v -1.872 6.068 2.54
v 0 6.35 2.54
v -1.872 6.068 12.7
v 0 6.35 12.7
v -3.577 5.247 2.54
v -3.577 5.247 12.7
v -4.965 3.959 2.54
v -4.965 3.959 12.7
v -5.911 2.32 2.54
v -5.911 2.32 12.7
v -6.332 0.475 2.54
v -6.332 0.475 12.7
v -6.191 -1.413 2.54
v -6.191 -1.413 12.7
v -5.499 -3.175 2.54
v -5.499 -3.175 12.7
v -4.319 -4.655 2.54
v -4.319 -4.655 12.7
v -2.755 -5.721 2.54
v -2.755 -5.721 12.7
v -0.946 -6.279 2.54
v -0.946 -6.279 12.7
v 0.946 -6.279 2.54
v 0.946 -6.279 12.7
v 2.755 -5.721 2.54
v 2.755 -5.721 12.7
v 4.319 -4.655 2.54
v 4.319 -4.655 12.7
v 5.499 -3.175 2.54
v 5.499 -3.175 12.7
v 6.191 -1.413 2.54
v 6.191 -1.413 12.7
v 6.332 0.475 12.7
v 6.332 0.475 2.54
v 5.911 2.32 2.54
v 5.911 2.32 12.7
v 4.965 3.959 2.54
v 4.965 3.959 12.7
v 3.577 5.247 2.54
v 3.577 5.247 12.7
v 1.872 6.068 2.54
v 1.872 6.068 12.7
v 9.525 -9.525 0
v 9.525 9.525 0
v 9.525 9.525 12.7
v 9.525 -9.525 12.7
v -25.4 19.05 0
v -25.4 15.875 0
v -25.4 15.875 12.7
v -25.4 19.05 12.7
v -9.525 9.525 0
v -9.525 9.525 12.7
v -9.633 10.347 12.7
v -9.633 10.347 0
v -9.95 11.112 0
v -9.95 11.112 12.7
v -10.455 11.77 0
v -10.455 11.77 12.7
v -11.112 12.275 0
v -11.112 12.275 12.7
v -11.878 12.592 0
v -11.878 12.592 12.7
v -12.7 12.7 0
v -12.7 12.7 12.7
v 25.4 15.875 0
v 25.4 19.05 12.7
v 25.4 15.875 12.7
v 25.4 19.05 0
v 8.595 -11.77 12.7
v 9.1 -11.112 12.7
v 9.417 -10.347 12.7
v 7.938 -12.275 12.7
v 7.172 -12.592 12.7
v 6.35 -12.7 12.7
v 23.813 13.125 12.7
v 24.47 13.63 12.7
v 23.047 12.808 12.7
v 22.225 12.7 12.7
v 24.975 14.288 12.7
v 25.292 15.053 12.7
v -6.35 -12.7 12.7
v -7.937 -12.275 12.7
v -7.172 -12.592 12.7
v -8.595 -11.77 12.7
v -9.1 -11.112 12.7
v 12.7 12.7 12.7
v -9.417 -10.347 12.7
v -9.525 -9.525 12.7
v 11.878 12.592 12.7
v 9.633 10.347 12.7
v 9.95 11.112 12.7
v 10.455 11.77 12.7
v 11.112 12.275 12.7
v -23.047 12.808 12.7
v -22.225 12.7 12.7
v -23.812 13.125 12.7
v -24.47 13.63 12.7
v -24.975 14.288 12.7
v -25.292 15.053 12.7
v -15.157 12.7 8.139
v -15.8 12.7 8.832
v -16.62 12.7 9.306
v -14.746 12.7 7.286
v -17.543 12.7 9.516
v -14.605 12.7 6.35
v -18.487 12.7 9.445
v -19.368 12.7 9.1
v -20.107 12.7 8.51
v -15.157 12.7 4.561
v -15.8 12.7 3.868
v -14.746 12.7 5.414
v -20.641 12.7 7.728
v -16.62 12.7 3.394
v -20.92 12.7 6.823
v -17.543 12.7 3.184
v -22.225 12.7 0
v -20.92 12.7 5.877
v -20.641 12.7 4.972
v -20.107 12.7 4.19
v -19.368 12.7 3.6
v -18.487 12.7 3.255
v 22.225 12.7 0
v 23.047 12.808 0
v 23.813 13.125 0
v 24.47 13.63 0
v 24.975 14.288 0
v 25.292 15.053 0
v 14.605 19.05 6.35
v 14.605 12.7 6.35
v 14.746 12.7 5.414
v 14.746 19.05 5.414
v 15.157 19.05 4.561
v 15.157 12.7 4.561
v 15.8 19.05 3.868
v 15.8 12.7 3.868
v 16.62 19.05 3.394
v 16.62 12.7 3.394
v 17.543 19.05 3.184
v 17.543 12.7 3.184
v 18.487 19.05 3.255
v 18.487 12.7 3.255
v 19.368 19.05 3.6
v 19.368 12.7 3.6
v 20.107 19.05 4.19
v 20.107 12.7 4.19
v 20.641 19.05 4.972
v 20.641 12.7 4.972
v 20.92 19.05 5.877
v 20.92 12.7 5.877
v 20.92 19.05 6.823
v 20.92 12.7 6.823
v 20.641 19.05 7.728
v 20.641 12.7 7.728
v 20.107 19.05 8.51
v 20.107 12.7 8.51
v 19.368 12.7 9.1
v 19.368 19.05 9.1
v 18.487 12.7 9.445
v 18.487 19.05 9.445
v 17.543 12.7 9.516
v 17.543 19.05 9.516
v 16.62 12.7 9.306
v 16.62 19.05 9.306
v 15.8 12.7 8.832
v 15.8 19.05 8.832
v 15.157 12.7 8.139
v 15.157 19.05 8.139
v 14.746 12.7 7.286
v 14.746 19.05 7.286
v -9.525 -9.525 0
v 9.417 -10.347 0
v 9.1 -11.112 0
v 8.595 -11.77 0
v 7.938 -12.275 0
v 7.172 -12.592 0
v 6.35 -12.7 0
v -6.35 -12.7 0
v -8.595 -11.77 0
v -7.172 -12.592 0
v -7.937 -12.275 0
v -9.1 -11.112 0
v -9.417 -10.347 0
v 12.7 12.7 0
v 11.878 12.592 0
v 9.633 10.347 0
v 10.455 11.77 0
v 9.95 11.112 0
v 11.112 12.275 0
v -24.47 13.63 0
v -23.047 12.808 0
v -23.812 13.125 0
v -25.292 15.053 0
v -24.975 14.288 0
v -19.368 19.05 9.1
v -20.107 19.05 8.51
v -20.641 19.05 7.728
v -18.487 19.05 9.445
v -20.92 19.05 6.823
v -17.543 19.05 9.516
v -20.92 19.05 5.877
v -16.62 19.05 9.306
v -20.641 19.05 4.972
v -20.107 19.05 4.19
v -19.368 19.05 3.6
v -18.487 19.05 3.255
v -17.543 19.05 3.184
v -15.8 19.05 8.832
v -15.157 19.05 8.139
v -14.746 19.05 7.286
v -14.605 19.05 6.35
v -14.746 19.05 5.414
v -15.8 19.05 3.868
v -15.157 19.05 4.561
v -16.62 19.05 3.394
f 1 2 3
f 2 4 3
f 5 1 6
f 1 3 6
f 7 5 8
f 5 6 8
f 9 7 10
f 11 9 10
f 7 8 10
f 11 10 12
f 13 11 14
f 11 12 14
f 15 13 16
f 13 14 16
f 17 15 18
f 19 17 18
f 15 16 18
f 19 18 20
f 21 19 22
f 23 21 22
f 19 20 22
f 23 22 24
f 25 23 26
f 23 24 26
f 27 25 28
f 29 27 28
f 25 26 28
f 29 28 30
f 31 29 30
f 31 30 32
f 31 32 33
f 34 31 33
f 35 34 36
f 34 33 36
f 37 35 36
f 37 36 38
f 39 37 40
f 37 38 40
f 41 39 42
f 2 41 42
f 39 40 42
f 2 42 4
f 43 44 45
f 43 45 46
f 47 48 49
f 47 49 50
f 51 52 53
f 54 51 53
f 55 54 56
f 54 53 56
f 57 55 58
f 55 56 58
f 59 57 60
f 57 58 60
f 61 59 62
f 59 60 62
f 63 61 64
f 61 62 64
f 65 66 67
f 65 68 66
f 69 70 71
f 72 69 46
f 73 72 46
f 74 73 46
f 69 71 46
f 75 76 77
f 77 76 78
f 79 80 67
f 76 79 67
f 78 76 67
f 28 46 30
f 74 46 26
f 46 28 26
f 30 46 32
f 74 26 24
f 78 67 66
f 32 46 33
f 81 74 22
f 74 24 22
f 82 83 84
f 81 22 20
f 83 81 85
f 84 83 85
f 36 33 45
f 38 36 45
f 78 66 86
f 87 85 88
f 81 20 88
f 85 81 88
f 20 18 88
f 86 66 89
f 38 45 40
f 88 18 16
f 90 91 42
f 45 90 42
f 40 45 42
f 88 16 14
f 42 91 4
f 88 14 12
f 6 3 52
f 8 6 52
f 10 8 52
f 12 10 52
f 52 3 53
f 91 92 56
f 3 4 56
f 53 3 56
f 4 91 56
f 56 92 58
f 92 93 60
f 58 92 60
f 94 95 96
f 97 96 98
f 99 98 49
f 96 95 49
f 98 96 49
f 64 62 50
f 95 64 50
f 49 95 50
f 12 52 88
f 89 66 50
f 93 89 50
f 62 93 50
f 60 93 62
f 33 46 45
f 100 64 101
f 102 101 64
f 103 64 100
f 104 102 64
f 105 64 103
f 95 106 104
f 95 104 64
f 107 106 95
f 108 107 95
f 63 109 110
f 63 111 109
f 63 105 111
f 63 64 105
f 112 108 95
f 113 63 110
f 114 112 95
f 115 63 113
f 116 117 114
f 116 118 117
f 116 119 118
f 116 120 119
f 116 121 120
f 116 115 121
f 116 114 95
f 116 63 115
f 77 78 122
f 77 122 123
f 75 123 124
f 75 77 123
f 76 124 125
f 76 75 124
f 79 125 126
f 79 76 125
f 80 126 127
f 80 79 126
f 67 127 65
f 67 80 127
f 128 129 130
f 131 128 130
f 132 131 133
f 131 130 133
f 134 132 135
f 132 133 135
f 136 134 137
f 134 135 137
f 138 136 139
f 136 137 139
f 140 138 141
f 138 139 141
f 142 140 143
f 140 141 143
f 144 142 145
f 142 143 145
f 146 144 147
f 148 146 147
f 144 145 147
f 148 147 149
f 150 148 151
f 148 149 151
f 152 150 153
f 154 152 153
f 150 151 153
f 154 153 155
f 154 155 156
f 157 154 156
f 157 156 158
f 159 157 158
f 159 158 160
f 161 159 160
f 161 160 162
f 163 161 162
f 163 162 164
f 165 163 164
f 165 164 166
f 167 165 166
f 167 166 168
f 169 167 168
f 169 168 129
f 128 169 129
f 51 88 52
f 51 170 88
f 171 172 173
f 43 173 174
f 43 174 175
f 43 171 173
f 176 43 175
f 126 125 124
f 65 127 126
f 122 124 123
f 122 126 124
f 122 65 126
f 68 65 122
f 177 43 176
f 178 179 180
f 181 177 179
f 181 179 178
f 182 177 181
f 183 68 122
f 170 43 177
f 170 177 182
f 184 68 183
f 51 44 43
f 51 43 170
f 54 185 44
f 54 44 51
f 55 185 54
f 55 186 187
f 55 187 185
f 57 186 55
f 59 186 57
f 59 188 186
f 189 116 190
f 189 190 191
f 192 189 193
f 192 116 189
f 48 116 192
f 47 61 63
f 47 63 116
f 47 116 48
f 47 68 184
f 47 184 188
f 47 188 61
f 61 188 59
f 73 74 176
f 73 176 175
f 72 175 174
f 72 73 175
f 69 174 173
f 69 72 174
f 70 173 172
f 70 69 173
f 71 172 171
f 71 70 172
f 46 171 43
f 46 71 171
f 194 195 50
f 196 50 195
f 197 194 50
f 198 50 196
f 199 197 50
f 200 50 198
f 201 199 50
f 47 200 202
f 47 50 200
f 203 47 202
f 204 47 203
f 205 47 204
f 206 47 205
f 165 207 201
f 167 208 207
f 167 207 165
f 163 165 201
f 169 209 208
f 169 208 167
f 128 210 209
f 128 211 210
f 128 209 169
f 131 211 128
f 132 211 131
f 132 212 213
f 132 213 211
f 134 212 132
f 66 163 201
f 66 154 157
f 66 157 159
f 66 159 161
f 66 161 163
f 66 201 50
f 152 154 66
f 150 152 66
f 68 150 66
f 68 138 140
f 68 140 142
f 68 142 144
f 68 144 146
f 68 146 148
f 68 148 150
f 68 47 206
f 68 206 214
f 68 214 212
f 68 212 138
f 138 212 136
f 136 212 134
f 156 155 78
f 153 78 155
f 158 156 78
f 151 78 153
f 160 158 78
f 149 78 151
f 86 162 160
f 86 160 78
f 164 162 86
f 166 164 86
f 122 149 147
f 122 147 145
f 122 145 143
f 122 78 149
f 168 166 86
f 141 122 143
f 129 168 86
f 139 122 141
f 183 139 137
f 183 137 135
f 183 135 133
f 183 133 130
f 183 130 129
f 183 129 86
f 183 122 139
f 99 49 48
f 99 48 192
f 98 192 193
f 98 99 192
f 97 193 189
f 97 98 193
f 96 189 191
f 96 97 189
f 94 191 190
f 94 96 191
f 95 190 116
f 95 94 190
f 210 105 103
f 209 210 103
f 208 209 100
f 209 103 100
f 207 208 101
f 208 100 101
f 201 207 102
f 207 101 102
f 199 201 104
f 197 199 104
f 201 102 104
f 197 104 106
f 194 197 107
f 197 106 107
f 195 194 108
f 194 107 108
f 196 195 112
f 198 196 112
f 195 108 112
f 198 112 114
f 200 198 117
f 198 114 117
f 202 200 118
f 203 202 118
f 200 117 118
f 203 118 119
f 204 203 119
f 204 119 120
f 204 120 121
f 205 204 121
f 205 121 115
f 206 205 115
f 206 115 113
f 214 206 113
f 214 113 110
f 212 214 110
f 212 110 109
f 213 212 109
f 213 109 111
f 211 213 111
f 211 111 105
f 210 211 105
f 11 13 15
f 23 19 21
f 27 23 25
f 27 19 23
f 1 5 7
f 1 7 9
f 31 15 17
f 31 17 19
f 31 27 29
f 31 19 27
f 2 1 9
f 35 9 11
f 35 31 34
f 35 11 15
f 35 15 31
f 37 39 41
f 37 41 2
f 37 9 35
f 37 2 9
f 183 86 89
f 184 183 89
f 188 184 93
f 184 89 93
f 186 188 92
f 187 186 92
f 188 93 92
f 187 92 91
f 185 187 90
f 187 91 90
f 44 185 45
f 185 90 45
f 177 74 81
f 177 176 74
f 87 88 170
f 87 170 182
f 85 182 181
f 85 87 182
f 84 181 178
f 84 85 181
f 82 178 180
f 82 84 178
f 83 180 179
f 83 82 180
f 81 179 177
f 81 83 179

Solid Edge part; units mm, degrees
sketch "Sketch1" plane through (0, 0, 0) normal (0, 0, 1) x (1, 0, 0)
  line L0 (-25.4, 19.05) -> (25.4, 19.05)
  line L1 (25.4, 19.05) -> (25.4, 12.7)
  line L2 (25.4, 12.7) -> (9.525, 12.7)
  line L3 (9.525, 12.7) -> (9.525, -12.7)
  line L4 (9.525, -12.7) -> (-9.525, -12.7)
  line L5 (-9.525, -12.7) -> (-9.525, 12.7)
  line L6 (-9.525, 12.7) -> (-25.4, 12.7)
  line L7 (-25.4, 12.7) -> (-25.4, 19.05)
  dimension "D1" = 6.35
  dimension "D2" = 19.05
  dimension "D3" = 6.35
  dimension "D4" = 50.8
  dimension "D5" = 25.4
  dimension "D6" = 15.875
  dimension "D7" = 15.875
  dimension "D8" = 25.4
extrude "Protrusion1" add sketch "Sketch1" along normal blind 12.7
fillet "Round_1" radius 3.175 6 edges at (9.525, 12.7, 6.35) (9.525, -12.7, 6.35) (-9.525, -12.7, 6.35) (25.4, 12.7, 6.35) (-9.525, 12.7, 6.35) (-25.4, 12.7, 6.35)
sketch "Sketch2" plane through (0, 3.175, 12.7) normal (0, 0, 1) x (0, 1, 0)
  circle A0 centre (-3.175, 0) radius 6.35
extrude "PivotHole" cut sketch "Sketch2" against normal blind 10.16
sketch "Sketch3" plane through (-17.4625, 12.7, 6.35) normal (0, -1, 0) x (1, 0, 0)
  circle A0 centre (-0.3175, 0) radius 3.175
  dimension "D1" = 4.445
  dimension "D2" = 6.35
  dimension "D3" = 7.62
extrude "v_1" cut sketch "Sketch3" against normal blind 25.4
mirror "Mirror1" about plane through (0, 0, 0) normal (1, 0, 0) of "v_1"
properties material "Aluminum, 6061-T6"
